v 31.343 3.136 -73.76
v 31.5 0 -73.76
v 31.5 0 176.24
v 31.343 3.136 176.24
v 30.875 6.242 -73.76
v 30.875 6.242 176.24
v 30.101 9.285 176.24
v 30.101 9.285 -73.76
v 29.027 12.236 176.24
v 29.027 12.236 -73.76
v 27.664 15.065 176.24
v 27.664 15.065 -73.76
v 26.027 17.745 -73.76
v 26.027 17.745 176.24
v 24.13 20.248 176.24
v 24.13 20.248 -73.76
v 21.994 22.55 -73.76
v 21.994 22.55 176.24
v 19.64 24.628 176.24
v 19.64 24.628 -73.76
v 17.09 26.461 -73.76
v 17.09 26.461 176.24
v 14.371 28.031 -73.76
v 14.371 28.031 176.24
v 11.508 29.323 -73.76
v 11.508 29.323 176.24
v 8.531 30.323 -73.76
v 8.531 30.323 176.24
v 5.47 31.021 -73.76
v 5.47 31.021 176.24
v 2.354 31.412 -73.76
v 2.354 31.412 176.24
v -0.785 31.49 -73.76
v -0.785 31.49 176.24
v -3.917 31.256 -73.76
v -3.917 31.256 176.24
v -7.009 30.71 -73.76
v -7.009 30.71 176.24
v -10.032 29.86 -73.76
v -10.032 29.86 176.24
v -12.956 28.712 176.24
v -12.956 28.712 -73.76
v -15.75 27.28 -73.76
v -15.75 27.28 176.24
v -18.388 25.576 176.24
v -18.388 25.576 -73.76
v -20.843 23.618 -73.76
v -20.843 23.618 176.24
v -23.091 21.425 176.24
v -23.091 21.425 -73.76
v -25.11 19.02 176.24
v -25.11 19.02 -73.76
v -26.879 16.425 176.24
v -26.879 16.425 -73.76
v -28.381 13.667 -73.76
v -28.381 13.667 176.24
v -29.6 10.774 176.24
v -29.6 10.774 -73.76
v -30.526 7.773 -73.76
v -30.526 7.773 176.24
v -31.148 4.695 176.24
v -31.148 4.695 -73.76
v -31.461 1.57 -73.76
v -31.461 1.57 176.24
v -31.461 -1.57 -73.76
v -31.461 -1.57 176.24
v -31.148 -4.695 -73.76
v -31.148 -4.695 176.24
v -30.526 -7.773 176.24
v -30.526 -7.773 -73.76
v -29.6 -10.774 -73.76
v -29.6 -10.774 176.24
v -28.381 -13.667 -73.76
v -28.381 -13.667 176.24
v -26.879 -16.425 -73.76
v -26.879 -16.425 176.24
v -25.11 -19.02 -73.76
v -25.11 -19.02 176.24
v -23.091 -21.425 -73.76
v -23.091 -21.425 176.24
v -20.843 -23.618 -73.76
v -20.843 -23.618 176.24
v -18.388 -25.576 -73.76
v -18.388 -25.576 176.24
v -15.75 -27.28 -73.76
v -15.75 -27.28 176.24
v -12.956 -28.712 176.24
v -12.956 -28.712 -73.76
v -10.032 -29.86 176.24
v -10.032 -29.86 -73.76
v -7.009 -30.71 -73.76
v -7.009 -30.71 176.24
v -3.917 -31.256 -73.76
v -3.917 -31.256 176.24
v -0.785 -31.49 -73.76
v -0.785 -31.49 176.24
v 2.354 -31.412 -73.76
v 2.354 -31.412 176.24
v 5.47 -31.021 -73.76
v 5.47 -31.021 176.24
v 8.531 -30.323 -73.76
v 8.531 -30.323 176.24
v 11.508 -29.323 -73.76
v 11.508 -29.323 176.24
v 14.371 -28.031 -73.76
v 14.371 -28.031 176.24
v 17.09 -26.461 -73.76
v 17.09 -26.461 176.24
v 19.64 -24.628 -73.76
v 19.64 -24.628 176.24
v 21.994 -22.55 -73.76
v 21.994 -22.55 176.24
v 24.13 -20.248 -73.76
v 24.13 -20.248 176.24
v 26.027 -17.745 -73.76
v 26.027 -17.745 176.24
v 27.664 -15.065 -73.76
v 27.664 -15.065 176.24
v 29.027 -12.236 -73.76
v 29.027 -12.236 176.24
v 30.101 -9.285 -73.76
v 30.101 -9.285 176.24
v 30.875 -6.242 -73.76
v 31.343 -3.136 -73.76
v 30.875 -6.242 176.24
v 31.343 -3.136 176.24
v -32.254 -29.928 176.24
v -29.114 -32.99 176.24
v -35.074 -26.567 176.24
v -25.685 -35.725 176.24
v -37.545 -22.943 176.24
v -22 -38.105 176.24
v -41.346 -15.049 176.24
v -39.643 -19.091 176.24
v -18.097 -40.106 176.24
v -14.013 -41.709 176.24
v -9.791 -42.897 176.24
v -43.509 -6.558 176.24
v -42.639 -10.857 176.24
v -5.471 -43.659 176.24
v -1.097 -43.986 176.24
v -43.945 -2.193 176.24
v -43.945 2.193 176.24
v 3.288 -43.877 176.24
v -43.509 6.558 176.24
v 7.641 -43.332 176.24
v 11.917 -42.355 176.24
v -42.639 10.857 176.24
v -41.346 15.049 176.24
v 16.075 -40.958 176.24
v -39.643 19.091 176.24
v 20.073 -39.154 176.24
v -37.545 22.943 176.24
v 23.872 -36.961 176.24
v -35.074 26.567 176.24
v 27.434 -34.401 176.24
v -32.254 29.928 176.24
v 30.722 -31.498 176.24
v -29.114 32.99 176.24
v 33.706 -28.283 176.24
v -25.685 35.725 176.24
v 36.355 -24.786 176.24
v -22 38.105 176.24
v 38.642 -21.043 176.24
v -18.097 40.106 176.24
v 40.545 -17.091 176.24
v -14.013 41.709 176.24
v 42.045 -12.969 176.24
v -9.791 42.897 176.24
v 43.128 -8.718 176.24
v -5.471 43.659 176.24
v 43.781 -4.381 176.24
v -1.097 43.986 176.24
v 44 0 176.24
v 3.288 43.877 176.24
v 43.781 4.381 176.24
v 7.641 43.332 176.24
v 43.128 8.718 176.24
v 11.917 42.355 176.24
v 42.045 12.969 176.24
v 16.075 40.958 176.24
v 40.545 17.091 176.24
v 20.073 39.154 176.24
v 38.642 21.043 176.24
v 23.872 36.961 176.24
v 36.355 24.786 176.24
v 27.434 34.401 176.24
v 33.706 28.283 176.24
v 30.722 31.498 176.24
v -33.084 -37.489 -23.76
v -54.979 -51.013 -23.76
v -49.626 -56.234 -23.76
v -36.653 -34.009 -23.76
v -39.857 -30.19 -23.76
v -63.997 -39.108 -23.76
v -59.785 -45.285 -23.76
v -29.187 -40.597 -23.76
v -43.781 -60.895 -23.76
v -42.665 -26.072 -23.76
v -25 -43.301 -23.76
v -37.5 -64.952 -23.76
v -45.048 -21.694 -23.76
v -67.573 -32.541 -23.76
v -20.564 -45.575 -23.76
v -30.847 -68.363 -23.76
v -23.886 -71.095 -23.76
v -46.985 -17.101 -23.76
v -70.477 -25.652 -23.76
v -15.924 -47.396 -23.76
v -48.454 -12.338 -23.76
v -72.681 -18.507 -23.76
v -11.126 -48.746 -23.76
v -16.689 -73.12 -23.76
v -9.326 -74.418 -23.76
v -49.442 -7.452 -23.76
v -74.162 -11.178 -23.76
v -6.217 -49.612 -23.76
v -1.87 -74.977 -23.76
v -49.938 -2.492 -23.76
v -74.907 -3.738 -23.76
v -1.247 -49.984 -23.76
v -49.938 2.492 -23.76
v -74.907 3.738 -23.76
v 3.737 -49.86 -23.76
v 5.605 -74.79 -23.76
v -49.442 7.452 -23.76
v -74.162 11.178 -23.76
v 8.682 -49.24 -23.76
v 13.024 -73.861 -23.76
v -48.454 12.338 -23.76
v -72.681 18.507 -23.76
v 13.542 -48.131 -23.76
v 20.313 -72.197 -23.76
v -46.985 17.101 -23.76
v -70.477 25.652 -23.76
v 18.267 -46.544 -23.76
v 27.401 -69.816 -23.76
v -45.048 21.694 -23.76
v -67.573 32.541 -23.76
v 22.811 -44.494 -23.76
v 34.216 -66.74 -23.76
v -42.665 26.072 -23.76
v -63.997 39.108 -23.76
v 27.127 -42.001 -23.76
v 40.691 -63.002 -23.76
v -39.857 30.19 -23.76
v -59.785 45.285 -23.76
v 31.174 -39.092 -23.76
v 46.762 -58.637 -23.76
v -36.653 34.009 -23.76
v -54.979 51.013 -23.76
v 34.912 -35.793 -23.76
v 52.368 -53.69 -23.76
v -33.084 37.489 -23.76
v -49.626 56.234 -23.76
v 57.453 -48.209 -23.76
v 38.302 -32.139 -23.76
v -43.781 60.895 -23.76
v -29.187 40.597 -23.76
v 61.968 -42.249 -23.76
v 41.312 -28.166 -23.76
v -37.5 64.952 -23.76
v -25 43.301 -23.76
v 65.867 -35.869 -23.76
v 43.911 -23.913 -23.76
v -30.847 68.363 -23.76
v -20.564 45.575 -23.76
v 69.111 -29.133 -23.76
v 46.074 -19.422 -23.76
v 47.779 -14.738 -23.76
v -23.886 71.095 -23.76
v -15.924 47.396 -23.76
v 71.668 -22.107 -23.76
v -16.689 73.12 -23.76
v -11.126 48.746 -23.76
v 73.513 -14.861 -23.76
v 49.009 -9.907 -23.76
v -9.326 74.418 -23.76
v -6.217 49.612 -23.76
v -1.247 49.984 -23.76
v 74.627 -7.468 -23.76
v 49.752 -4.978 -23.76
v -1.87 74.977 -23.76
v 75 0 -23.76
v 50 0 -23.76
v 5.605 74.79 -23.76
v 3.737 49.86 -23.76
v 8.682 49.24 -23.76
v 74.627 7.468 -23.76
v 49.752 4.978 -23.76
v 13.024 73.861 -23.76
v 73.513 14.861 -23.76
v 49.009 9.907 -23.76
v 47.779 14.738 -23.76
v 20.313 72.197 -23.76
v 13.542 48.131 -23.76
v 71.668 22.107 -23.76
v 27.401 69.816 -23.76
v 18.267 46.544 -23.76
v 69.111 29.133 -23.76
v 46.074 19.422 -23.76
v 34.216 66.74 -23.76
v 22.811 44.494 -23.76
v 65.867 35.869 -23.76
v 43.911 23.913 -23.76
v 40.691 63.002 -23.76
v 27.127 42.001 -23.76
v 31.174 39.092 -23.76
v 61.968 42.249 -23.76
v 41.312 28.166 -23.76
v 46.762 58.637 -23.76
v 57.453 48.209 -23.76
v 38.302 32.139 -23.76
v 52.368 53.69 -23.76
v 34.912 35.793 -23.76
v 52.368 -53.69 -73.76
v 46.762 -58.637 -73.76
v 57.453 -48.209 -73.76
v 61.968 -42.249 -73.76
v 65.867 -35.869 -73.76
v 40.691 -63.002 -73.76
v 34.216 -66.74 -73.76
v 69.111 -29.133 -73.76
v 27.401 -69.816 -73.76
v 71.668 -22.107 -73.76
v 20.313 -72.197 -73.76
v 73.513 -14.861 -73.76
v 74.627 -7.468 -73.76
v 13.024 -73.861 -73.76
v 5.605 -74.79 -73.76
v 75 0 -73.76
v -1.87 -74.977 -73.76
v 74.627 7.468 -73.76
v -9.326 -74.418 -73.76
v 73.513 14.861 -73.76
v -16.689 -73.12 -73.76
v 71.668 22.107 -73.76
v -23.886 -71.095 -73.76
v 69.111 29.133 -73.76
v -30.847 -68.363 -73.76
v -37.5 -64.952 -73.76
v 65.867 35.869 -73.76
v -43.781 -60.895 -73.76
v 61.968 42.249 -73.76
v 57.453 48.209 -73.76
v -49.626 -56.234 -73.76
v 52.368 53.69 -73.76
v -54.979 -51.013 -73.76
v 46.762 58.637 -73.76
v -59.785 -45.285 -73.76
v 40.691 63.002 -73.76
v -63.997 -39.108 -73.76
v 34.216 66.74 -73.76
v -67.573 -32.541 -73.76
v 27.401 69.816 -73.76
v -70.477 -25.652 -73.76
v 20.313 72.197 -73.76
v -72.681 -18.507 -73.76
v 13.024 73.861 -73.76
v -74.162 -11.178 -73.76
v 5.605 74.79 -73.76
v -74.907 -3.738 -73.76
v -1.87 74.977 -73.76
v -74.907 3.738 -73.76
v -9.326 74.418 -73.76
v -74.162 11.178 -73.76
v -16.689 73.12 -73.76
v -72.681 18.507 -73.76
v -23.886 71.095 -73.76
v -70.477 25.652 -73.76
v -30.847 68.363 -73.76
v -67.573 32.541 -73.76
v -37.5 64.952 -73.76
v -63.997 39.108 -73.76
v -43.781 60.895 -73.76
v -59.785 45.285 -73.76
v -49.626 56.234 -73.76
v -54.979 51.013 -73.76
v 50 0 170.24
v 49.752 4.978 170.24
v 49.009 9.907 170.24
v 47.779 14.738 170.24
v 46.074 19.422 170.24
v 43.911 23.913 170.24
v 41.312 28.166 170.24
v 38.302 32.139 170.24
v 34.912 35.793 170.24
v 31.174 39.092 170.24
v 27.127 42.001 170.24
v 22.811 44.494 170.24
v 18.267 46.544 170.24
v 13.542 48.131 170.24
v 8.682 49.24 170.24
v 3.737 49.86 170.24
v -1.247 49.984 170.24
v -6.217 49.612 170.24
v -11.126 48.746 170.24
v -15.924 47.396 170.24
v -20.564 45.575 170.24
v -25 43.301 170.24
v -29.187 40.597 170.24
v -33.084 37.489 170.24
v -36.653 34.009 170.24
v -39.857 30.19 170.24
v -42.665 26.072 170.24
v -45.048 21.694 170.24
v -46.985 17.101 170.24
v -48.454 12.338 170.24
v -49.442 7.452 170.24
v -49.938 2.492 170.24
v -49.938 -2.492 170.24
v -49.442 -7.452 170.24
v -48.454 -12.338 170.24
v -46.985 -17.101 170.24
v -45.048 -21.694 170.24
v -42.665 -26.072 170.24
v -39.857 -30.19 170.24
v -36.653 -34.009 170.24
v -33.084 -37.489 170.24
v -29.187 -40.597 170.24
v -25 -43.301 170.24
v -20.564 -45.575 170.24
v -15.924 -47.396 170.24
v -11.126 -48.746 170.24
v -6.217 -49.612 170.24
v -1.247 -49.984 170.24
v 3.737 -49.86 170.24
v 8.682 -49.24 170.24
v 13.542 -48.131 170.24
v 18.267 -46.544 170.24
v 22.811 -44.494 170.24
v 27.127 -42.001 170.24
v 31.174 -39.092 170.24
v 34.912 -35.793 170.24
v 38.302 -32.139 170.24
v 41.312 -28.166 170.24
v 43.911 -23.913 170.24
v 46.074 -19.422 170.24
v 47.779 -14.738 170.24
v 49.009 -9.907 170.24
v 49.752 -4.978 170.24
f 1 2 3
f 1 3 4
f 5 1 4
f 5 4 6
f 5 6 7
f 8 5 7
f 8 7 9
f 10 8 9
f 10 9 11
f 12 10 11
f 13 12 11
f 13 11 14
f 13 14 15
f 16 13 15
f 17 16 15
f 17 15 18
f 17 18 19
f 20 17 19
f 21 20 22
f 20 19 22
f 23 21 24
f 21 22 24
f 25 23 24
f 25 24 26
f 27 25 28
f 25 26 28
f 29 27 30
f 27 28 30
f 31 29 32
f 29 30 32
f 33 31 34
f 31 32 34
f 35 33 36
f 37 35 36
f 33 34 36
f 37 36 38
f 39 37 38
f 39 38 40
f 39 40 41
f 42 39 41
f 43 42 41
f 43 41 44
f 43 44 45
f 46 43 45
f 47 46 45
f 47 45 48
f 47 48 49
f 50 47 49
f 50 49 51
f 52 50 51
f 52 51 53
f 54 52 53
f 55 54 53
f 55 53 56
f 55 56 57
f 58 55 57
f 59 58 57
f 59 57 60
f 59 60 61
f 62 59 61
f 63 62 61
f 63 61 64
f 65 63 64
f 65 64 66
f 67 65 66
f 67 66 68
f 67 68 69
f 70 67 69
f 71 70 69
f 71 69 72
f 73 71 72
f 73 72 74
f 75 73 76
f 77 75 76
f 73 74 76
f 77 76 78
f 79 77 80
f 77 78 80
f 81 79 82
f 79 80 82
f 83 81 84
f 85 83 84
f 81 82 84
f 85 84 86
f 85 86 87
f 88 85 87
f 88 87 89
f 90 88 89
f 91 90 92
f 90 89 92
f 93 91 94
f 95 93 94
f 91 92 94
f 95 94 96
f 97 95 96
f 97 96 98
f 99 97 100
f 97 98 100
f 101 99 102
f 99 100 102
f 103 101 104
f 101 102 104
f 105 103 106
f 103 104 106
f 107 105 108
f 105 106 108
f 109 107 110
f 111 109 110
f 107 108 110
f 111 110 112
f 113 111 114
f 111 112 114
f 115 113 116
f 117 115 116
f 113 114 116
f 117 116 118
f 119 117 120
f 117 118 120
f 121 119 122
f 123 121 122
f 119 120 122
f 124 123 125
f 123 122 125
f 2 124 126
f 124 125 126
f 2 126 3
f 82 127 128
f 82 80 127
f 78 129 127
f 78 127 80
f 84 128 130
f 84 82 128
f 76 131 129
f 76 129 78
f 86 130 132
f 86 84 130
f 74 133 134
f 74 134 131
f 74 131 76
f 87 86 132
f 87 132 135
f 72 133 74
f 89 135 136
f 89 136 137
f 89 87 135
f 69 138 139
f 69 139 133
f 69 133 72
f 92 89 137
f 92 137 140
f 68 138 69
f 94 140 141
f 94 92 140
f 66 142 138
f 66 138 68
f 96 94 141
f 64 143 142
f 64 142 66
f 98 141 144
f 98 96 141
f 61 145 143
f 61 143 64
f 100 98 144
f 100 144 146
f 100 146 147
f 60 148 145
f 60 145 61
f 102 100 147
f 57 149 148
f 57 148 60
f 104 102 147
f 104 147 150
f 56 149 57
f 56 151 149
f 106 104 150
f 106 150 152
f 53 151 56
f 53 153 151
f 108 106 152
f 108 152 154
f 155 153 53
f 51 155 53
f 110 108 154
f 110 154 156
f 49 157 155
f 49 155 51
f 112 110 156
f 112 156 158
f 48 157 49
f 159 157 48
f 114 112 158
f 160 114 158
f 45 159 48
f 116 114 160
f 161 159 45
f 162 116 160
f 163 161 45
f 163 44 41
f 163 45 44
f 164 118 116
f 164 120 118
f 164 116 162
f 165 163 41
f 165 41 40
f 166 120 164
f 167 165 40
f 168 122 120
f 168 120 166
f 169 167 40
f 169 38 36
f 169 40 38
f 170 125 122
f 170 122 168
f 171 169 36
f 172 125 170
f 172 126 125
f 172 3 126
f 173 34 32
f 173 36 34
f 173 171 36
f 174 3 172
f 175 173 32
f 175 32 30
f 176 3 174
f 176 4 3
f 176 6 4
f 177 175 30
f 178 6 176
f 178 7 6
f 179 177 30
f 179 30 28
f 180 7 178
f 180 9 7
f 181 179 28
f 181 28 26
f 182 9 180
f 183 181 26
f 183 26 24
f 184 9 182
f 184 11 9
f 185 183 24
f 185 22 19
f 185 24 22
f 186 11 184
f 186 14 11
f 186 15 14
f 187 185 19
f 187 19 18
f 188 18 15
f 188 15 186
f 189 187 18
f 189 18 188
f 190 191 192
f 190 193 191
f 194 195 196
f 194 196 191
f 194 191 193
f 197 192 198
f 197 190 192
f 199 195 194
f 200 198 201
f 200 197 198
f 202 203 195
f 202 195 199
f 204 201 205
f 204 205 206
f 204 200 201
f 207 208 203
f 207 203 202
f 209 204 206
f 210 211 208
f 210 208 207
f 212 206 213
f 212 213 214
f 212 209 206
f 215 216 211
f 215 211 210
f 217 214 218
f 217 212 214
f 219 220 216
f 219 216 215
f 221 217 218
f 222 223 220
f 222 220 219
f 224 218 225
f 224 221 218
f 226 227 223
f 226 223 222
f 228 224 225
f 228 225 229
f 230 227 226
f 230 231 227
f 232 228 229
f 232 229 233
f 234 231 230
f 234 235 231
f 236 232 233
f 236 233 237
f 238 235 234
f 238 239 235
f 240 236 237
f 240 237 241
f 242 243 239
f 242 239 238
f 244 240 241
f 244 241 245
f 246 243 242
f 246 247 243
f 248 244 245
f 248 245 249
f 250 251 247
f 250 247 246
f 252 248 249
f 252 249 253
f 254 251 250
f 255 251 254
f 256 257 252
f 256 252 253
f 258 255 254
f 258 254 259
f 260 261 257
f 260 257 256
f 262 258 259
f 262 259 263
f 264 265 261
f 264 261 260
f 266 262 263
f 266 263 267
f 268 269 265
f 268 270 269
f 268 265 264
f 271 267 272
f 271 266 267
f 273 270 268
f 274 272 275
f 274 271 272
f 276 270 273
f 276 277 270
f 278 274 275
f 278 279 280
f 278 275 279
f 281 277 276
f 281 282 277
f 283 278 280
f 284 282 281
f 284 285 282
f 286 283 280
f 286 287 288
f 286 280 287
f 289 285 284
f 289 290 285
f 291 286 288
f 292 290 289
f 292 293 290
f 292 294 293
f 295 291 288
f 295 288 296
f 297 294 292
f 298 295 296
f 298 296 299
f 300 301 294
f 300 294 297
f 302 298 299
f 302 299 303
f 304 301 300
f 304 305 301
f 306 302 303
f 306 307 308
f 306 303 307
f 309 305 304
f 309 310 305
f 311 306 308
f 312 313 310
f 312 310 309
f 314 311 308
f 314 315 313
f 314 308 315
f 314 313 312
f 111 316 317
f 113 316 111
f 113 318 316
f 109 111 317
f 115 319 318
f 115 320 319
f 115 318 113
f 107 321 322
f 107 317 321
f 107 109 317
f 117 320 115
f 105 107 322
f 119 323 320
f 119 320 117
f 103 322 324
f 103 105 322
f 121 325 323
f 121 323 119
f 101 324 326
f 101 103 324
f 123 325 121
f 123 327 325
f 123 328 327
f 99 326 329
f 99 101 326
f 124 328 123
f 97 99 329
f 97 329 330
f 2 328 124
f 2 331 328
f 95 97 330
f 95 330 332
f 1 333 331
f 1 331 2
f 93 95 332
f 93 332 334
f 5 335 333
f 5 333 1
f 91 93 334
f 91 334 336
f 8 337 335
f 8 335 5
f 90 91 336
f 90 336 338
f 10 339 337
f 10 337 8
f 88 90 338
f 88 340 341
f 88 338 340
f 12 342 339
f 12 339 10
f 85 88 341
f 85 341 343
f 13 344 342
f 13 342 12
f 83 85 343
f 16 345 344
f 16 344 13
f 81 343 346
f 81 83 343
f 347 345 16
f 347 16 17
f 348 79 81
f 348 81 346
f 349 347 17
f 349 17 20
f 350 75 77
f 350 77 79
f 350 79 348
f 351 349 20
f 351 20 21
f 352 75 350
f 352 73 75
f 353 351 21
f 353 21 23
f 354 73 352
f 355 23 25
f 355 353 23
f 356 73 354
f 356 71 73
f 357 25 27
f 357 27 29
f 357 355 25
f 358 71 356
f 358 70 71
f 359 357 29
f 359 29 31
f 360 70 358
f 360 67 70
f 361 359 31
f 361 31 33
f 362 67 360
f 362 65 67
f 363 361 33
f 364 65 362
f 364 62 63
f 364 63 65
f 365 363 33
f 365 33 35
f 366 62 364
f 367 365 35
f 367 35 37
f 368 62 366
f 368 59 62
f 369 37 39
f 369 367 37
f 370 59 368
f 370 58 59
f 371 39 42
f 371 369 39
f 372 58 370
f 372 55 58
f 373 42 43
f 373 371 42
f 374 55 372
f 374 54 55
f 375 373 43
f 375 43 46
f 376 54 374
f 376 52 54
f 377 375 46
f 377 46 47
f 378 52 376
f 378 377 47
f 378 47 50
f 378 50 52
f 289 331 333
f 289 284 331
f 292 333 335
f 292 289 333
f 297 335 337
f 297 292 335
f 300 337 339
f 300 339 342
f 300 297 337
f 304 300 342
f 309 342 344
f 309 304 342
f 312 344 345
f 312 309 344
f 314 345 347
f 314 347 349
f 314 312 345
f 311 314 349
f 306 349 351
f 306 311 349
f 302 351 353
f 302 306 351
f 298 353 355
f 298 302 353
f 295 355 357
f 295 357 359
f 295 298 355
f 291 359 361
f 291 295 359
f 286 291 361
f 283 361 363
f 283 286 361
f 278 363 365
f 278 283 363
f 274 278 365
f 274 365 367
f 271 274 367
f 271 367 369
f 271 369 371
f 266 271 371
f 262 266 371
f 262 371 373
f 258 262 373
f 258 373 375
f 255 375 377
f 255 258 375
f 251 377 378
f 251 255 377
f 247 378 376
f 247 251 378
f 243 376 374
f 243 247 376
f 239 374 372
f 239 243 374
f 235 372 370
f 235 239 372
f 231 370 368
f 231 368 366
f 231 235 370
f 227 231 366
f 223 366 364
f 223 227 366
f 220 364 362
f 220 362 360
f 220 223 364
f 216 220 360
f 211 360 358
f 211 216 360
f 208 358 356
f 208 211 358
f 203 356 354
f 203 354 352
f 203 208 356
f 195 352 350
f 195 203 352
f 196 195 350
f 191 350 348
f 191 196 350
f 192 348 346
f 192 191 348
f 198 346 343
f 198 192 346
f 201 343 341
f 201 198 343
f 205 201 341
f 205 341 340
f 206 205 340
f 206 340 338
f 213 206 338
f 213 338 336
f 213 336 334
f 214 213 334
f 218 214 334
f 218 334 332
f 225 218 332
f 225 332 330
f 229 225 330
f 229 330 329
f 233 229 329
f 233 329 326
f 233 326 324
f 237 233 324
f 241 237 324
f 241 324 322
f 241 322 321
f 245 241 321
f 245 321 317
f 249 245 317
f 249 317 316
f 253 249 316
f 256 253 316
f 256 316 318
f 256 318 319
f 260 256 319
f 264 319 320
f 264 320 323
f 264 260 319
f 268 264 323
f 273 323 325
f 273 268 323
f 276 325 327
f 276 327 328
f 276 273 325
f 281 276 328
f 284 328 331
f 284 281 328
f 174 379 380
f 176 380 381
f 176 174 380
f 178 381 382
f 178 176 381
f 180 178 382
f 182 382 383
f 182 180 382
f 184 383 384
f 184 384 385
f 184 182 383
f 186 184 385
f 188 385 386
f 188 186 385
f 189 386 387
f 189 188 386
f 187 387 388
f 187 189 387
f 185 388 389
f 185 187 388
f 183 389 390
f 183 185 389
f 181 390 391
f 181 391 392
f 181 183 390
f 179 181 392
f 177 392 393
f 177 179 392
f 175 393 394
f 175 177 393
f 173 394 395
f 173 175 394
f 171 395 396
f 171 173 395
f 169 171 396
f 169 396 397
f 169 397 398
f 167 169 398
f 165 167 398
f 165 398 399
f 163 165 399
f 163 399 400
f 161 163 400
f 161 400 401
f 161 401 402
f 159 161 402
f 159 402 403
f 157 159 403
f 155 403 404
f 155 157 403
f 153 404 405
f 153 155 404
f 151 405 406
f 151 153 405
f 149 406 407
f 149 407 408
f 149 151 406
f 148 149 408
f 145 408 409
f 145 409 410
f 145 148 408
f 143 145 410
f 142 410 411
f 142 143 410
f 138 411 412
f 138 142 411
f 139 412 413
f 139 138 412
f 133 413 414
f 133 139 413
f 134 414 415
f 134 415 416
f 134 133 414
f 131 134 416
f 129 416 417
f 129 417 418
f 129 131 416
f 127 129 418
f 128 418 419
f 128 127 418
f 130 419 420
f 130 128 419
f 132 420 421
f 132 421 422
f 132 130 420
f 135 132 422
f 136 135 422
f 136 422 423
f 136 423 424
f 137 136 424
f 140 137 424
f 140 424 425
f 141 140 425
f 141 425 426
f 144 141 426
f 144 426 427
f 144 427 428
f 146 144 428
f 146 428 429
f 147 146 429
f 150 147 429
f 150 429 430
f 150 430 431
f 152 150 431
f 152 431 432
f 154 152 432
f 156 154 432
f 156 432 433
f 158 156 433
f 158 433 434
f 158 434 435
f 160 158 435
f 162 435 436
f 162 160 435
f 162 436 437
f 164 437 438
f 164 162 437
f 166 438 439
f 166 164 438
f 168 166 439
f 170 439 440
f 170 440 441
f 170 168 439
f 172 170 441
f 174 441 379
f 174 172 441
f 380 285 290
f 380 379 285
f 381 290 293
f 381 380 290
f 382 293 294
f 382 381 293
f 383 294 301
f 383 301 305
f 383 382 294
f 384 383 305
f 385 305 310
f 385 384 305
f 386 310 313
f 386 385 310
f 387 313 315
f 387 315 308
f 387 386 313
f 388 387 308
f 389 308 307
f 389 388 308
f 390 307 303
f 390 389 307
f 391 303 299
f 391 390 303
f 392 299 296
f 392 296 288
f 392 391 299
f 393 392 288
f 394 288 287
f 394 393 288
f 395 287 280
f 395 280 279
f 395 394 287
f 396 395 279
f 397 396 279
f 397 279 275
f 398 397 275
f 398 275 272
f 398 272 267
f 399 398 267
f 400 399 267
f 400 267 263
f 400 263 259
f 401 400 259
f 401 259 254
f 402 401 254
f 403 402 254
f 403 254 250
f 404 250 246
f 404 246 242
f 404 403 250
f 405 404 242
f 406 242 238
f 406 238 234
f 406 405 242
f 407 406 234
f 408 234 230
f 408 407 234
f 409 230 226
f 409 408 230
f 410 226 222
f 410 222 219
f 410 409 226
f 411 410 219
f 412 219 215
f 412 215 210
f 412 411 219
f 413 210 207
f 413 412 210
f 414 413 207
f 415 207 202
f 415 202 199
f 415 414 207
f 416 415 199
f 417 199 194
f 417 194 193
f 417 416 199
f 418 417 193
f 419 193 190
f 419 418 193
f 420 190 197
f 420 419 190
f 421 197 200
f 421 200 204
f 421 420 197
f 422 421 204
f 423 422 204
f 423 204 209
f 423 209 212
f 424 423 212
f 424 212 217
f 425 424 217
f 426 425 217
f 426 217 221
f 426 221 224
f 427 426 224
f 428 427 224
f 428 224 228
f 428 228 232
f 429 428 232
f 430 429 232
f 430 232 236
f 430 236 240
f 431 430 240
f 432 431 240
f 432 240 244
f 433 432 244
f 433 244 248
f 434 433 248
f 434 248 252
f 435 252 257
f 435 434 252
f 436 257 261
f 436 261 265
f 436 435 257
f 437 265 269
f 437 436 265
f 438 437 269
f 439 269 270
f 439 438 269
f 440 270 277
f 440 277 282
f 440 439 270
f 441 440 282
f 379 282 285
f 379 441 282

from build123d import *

# Parameters (mm, degrees)
SKETCH2_R          = 31.5
CUT_EXTRUDE1_DEPTH = 251


with BuildPart() as part:
    # Sketch1 → Revolve1 (revolve)
    with BuildSketch(Plane(origin=(0, 0, 0), x_dir=(1, 0, 0), z_dir=(0, 1, 0))):
        Polygon((0, 73.759969248), (75, 73.759969248), (75, 23.759969248), (50, 23.759969248), (50, -170.240030752), (44, -176.240030752), (0, -176.240030752), align=None)
    revolve(axis=Axis((0, 0, -73.759969248), (0, 0, 1)))

    # Sketch2 → Cut-Extrude1 (cut, through all)
    with BuildSketch(Plane.XY.offset(176.240030752)):
        Circle(SKETCH2_R)
    extrude(amount=-CUT_EXTRUDE1_DEPTH, mode=Mode.SUBTRACT)


solid = part.part
